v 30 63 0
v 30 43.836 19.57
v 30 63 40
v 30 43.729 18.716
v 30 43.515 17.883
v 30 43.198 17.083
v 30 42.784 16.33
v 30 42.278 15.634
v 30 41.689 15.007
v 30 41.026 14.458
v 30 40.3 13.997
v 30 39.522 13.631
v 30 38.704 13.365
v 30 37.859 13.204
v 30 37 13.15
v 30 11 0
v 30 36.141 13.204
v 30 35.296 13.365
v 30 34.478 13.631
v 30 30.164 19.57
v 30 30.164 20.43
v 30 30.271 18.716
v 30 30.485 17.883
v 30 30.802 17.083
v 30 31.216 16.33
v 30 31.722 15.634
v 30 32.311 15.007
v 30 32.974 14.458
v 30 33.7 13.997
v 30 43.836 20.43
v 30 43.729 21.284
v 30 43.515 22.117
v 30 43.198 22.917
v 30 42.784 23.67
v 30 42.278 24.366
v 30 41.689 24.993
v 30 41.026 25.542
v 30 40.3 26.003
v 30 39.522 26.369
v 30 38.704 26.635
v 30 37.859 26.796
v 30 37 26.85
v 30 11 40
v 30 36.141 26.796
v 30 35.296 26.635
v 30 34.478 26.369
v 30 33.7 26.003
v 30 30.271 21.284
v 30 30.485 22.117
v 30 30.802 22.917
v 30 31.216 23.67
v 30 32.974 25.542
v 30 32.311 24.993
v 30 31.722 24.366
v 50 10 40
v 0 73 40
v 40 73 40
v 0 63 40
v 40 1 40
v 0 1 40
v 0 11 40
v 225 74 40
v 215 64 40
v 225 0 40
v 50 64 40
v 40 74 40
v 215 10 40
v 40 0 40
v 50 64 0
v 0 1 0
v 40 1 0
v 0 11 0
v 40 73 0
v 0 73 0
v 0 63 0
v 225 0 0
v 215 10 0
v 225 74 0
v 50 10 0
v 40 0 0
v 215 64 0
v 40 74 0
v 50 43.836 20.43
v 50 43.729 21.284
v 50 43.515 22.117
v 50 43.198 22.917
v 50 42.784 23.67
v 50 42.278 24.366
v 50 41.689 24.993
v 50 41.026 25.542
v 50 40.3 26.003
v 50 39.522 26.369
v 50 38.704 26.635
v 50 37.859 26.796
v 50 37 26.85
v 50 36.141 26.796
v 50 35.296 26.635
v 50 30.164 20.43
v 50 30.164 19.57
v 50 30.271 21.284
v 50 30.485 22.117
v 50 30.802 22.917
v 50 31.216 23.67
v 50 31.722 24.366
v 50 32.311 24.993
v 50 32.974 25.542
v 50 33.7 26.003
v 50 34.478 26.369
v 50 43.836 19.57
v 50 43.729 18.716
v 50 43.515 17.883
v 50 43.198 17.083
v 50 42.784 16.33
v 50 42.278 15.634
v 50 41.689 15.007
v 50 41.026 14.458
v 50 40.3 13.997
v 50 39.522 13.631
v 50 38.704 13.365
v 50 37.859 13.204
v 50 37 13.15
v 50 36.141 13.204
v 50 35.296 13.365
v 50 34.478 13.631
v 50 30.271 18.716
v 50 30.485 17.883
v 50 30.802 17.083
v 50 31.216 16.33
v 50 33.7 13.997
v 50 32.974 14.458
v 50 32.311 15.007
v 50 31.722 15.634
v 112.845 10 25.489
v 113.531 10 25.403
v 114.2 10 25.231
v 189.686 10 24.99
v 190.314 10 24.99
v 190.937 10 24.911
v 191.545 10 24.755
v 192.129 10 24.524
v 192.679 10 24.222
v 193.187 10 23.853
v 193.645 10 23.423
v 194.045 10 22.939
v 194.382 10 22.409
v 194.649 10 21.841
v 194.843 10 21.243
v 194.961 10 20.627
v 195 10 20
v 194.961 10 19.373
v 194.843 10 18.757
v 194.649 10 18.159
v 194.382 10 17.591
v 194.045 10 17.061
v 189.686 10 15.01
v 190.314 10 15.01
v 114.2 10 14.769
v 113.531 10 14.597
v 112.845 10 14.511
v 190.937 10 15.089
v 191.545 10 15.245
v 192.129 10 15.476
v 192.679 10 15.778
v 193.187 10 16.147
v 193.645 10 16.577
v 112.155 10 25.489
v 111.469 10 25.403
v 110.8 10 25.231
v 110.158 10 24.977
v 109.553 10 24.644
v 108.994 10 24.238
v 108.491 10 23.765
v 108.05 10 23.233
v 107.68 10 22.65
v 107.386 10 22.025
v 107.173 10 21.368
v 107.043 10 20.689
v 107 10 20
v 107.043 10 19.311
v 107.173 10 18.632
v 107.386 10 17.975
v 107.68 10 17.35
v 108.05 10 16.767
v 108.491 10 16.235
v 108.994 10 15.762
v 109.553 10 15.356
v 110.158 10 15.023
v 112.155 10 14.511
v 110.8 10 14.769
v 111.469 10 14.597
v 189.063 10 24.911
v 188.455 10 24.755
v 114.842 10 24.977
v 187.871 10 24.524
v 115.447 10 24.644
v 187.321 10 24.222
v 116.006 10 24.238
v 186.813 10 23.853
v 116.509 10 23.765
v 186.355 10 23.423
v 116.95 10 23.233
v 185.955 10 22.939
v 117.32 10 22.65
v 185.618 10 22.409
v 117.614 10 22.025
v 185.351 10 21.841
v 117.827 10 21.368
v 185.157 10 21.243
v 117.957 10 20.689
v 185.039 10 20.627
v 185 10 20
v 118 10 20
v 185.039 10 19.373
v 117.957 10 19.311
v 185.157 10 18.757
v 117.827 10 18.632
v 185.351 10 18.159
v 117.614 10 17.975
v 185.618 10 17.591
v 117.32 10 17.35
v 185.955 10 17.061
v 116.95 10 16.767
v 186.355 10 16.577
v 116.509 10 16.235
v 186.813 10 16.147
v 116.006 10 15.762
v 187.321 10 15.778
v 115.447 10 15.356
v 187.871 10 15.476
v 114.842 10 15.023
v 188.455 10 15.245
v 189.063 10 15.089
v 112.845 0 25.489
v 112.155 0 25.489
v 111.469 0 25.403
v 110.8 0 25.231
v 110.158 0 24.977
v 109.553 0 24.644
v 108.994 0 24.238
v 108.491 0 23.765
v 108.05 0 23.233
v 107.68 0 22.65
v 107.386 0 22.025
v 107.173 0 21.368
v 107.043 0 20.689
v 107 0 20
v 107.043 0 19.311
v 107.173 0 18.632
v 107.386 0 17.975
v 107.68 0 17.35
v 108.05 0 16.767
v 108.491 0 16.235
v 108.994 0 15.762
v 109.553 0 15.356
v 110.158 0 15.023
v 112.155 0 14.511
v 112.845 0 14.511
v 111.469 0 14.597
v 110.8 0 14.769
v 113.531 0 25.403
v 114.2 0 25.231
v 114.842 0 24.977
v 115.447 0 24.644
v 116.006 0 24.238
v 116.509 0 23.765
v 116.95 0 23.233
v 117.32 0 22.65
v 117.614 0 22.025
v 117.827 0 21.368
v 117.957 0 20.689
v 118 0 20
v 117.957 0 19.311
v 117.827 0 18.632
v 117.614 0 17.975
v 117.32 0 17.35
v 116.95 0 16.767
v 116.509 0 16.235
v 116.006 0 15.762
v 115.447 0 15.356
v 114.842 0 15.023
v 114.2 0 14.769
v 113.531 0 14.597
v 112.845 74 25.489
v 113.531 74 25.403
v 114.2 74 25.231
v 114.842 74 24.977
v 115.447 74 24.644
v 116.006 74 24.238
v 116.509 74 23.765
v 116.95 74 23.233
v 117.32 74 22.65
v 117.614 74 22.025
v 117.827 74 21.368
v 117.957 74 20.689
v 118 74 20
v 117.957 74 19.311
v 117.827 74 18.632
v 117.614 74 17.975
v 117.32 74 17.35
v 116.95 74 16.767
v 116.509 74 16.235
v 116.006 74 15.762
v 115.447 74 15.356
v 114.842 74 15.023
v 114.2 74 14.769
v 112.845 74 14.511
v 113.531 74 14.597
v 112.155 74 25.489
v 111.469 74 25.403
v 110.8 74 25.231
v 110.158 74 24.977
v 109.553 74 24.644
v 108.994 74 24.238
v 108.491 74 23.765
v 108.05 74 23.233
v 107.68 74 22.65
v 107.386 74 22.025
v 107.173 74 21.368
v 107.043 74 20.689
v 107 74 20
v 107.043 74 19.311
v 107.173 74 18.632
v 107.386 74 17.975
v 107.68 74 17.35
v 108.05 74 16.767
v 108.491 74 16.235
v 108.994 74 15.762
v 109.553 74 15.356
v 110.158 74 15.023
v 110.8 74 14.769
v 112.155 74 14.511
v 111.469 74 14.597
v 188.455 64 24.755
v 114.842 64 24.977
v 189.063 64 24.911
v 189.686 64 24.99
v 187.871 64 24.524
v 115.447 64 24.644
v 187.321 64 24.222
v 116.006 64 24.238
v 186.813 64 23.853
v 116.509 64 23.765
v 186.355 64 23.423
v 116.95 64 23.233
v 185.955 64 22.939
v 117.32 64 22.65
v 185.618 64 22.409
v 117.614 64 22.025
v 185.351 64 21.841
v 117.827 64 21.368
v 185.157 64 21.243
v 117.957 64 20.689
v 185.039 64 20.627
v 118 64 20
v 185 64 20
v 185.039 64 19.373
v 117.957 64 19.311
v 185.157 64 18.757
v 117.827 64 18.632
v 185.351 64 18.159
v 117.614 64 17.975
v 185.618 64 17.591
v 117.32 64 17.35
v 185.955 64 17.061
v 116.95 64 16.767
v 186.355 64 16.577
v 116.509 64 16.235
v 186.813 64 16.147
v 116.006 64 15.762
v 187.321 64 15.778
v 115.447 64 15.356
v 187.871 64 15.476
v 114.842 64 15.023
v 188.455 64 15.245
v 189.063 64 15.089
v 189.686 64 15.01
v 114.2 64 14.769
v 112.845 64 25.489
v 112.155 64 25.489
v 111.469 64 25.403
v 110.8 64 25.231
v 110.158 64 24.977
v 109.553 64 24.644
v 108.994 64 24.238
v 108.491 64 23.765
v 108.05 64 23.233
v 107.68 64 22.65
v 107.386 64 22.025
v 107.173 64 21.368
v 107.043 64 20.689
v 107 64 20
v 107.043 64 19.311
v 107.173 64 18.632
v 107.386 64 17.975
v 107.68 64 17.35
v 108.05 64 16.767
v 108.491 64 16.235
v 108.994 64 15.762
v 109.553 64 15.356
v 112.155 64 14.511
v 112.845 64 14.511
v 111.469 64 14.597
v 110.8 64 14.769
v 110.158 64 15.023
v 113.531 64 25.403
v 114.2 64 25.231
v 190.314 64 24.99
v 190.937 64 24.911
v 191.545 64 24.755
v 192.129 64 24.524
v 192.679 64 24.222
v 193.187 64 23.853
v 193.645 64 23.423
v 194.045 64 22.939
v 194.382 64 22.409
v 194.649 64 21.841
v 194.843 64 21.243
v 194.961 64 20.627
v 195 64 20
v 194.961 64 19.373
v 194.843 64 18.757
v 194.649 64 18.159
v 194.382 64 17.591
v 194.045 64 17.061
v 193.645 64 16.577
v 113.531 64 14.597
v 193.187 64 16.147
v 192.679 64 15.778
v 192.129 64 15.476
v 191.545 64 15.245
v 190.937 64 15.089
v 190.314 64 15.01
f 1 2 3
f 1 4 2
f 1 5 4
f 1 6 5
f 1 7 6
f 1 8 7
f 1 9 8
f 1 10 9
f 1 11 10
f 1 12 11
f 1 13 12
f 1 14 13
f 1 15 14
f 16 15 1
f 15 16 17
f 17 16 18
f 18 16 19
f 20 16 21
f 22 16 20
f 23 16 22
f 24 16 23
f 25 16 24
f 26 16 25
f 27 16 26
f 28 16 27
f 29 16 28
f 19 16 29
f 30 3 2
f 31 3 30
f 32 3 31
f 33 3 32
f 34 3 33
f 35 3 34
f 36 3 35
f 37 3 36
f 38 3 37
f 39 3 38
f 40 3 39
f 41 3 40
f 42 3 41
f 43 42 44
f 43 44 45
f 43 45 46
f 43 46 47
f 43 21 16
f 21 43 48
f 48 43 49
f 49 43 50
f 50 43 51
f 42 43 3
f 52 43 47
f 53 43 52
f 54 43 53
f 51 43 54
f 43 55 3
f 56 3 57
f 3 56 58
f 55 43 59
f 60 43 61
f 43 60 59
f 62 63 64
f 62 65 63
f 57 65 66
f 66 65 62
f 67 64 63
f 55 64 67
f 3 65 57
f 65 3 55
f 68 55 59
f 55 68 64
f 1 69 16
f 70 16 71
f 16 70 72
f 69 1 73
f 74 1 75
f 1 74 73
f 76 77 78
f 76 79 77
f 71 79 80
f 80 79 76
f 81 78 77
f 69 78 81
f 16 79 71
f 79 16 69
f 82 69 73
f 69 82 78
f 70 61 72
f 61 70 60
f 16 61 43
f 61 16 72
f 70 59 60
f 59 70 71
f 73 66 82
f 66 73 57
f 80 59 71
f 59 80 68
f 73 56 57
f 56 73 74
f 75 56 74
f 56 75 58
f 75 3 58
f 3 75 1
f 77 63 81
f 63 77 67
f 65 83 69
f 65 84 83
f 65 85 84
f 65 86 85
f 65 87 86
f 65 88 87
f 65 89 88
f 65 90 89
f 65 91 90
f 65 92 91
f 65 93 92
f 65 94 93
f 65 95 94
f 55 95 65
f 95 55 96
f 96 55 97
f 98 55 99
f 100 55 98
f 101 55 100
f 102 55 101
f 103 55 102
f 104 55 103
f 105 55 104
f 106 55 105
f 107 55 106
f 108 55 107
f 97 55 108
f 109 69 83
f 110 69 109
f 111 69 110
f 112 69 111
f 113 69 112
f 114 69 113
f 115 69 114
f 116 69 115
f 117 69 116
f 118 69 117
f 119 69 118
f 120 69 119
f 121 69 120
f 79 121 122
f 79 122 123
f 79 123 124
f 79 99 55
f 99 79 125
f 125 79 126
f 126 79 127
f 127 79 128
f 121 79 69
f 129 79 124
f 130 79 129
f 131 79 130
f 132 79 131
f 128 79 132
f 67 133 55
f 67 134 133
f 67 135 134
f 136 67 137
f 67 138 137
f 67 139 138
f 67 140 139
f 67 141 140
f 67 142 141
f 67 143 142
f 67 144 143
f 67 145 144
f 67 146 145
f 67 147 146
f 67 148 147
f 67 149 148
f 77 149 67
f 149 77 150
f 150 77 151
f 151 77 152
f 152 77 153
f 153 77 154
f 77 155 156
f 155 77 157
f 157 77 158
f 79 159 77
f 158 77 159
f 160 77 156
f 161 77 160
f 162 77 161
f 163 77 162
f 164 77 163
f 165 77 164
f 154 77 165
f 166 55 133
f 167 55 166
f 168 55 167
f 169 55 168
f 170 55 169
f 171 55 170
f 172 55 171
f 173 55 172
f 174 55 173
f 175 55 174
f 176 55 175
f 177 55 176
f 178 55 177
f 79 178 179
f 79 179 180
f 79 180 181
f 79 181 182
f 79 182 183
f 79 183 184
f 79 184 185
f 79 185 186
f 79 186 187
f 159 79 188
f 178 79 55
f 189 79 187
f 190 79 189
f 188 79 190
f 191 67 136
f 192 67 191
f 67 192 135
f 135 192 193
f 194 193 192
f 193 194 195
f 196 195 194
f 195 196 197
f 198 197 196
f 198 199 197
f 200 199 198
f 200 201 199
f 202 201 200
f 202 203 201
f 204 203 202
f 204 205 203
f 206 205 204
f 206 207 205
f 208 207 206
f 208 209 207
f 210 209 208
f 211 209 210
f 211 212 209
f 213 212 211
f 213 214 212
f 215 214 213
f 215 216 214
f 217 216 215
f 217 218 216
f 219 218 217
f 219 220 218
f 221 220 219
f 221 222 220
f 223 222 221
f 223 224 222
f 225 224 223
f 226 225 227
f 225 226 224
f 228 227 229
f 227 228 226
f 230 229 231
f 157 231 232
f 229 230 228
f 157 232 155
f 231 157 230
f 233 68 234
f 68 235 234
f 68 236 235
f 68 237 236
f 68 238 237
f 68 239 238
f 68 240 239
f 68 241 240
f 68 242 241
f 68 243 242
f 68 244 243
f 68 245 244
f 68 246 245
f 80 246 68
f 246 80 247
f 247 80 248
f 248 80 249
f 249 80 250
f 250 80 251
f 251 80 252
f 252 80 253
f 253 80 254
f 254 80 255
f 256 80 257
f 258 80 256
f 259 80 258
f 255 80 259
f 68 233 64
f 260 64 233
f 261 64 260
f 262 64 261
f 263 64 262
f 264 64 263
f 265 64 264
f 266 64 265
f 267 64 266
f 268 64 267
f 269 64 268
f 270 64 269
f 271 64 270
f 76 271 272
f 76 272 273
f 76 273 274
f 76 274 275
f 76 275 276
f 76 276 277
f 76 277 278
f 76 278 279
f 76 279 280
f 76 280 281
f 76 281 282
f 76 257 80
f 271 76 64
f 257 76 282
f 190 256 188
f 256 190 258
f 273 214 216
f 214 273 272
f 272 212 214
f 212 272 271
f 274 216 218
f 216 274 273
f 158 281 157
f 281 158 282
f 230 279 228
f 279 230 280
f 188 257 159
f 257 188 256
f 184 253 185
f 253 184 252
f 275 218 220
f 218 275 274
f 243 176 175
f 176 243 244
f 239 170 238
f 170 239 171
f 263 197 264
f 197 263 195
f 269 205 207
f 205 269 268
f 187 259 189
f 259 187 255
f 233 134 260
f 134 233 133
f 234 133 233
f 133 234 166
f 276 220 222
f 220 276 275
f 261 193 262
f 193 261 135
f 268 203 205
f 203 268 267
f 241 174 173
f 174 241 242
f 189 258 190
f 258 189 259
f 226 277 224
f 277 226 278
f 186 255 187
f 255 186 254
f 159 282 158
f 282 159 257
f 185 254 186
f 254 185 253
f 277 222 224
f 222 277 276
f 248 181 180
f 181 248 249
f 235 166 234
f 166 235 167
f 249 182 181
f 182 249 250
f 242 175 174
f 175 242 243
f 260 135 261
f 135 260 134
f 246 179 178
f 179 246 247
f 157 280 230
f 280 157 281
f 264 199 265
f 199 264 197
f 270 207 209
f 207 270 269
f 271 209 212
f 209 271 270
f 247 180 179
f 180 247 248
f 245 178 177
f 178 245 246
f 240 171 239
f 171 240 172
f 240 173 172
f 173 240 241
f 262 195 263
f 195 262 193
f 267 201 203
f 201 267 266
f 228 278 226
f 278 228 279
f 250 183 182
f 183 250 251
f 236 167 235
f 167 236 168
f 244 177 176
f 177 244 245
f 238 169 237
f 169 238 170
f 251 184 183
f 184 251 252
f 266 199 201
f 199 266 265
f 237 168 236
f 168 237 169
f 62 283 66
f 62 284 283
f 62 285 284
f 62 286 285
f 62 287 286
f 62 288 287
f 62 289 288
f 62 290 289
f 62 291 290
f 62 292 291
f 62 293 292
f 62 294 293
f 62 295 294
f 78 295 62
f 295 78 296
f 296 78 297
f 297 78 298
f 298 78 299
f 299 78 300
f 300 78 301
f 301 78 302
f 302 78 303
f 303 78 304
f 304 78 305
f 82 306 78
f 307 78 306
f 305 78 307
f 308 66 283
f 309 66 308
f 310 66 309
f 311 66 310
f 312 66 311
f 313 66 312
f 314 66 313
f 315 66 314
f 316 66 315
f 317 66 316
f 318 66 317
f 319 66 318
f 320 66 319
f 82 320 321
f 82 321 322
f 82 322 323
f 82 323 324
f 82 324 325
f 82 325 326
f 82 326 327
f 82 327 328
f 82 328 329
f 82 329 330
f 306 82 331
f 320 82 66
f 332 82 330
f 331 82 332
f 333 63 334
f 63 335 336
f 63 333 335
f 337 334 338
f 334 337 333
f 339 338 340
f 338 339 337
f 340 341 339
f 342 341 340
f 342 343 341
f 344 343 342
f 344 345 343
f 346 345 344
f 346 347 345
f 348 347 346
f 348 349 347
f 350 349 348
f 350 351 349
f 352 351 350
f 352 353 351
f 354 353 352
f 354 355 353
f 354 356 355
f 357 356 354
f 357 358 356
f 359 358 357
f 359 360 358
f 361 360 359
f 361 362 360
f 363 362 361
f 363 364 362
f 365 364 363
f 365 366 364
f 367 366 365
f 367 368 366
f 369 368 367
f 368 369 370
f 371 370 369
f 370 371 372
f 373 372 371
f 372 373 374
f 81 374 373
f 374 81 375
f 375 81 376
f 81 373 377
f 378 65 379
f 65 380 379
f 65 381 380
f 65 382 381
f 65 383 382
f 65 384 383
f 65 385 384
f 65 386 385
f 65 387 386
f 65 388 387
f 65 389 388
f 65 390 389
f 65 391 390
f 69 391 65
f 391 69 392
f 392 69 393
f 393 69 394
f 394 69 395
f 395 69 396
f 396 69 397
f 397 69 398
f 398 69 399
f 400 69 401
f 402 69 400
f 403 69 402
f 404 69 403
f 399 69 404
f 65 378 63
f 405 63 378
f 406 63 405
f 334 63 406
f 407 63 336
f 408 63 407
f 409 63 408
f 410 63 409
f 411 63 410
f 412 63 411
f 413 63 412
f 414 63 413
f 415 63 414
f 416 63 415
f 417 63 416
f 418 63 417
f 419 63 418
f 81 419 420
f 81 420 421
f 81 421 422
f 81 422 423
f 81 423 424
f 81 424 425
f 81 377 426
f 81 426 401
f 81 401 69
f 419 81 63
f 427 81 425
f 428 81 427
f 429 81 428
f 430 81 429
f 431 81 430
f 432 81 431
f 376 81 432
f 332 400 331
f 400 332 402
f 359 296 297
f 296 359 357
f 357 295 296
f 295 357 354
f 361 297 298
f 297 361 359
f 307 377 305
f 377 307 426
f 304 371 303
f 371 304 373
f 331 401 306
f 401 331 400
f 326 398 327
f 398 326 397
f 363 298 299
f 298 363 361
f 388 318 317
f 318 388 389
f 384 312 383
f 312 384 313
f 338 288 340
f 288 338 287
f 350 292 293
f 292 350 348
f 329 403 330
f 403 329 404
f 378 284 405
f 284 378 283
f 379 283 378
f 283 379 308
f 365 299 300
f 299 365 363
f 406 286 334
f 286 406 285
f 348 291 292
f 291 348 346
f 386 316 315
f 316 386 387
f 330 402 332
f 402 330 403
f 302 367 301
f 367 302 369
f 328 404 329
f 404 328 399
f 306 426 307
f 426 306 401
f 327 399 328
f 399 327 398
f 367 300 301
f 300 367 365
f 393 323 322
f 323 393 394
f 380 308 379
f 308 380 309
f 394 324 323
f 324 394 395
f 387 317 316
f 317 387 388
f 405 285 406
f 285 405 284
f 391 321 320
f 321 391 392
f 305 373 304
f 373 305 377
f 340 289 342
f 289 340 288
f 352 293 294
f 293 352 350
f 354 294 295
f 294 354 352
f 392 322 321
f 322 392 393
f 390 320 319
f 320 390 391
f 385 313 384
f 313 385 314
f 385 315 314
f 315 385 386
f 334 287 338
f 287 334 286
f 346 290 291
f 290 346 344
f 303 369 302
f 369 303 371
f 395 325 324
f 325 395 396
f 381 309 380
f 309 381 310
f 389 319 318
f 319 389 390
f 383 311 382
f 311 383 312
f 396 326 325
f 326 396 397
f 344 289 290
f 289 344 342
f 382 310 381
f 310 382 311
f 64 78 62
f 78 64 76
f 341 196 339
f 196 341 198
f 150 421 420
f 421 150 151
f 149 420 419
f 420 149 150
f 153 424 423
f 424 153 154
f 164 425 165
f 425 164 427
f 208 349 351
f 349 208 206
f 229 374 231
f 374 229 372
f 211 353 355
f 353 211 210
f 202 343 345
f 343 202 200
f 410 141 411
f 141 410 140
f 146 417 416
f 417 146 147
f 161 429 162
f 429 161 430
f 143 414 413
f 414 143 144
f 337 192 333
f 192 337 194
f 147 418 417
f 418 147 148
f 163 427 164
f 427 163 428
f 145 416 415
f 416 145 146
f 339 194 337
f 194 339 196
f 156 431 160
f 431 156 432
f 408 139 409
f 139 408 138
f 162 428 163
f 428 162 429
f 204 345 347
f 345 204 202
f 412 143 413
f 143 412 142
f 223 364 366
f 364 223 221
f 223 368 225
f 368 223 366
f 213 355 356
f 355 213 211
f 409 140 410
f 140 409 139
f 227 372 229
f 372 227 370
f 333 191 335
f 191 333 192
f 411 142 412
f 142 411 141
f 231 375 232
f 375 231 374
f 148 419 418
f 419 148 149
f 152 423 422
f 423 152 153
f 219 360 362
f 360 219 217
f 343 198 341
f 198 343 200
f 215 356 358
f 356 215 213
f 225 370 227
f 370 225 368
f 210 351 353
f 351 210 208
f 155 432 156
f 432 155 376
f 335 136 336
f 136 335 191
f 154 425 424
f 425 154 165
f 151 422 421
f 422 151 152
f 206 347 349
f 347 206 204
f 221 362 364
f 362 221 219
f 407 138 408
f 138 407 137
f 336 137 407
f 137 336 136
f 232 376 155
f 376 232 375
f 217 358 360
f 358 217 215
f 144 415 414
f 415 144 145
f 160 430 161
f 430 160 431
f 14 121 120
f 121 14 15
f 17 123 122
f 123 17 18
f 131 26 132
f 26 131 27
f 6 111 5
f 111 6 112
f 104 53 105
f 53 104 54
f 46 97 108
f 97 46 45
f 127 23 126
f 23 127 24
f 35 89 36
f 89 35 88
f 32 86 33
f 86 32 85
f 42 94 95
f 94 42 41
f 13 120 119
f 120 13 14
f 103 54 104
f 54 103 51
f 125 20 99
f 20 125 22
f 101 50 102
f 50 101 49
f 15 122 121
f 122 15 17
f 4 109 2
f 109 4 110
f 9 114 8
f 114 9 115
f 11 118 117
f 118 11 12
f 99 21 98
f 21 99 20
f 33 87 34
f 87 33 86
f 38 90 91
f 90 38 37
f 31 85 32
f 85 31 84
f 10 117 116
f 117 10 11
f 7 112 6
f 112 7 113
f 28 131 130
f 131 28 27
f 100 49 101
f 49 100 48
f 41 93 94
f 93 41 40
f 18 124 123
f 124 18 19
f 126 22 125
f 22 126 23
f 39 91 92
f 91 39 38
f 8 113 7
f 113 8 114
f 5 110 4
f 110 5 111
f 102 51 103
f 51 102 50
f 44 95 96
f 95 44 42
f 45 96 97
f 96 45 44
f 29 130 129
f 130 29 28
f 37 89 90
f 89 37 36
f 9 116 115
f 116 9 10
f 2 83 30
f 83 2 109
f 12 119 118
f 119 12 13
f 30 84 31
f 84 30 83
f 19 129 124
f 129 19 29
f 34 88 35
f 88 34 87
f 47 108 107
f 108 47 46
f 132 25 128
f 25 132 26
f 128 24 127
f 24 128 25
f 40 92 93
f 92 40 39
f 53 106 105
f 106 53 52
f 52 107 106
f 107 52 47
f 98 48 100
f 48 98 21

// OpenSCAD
$fn=50;

arm_diameter = 10;
arm_radius = arm_diameter/2;
split_width = 3;
body_heft = 10;
wrap_width = 50;
wrapped_diameter = 75;
wrap_side_clearance = 4;
wrapped_rear_clearance = 20;
wrapped_front_clearance = 40;
crank_length = 30;
crank_handle_length = 50;
body_height = 40;
guidebar_front_clearance = 20;

body_inner_length = wrapped_rear_clearance + wrapped_diameter + wrapped_front_clearance + arm_diameter + guidebar_front_clearance;
body_outer_width = 2*body_heft + wrap_width + wrap_side_clearance;

bracket_flange_depth = 30;
bracket_inner_width = 52;
screw_hole_diameter = 13.7;
screw_hole_radius = screw_hole_diameter/2; 

module RollerArm() {
	
	module SplitPin(split_part_length) {
			difference() {
				translate([0, arm_radius])
					union() {
						rotate([270, 0, 0])	
							cylinder(d=arm_diameter, h=split_part_length - arm_radius); // main split pin body
						
						sphere(d=arm_diameter);
					}
				
				translate([-split_width/2, -arm_radius, -arm_radius])
					cube([split_width, split_part_length + arm_diameter - 2, arm_diameter]); // minus the split
			}
	}


	split_part_length = 3*body_heft + wrap_width + wrap_side_clearance;
	
	// make the split pin part	
	SplitPin(split_part_length);	
	
	// make the crank arm piece
	hull() {
		translate([0, split_part_length, 0])
			rotate([270, 0, 0])			
				cylinder(d=arm_diameter, h=body_heft);
		
		translate([crank_length, split_part_length, 0])
			rotate([270, 0, 0])			
				cylinder(d=arm_diameter, h=body_heft);
	}
	
	// make the crank handle
	translate([crank_length, split_part_length + body_heft, 0])
		rotate([270, 0, 0])			
			cylinder(d=arm_diameter, h=crank_handle_length);
}

module RollerBody() {
	module RollerBodySide() {	
		difference() {
			cube([body_inner_length, body_heft, body_height]);
			
			translate([wrapped_rear_clearance + wrapped_diameter/2 + arm_radius, -1, body_height/2])
				rotate([270, 0, 0])
					cylinder(d=arm_diameter + 1, h=body_heft+2);
		}
	}
	
	module RollerBodyRear() {	
		cube([body_heft, body_outer_width, body_height]);
	}
	
	RollerBodyRear(); // rear
	
	translate([body_heft, 0, 0])
		RollerBodySide(); // left side
	
	translate([body_heft, body_outer_width - body_heft, 0])
		RollerBodySide(); // right side
	
	translate([body_inner_length + body_heft, 0, 0]) 
		RollerBodyRear(); // front
	
	color("blue")
	translate([body_inner_length + body_heft - guidebar_front_clearance - arm_radius, 0, body_height/2])
		rotate([270, 0, 0])
			cylinder(d=arm_diameter, h=body_outer_width); // guide bar
}

module RollerBodyWithBracket() {
	// figure out the mid line position
	bracket_outer_width = bracket_inner_width + 2*body_heft;
	mid_pos = max(body_outer_width, bracket_outer_width) / 2;
	
	difference() {
		union() {
			// bracket
			translate([0, mid_pos - bracket_outer_width/2, 0])
				union() {
					cube([bracket_flange_depth, body_heft, body_height]); // left side
					
					translate([bracket_flange_depth, 0, 0])
						cube([body_heft, bracket_outer_width, body_height]); // right
					
					translate([0, bracket_inner_width + body_heft, 0])
						cube([bracket_flange_depth, body_heft, body_height]); // right side
				}
			
			// body
			translate([bracket_flange_depth + body_heft, mid_pos - body_outer_width/2, 0])
				RollerBody();
		}	
		// mounting hole
		color("blue")
		translate([bracket_flange_depth, mid_pos, body_height/2])
			rotate([0, 90, 0])
				cylinder(d=screw_hole_diameter, h=2*body_heft);
	}
}

//translate([80, -150, 0])
//RollerArm();
//RollerBody();
RollerBodyWithBracket();
